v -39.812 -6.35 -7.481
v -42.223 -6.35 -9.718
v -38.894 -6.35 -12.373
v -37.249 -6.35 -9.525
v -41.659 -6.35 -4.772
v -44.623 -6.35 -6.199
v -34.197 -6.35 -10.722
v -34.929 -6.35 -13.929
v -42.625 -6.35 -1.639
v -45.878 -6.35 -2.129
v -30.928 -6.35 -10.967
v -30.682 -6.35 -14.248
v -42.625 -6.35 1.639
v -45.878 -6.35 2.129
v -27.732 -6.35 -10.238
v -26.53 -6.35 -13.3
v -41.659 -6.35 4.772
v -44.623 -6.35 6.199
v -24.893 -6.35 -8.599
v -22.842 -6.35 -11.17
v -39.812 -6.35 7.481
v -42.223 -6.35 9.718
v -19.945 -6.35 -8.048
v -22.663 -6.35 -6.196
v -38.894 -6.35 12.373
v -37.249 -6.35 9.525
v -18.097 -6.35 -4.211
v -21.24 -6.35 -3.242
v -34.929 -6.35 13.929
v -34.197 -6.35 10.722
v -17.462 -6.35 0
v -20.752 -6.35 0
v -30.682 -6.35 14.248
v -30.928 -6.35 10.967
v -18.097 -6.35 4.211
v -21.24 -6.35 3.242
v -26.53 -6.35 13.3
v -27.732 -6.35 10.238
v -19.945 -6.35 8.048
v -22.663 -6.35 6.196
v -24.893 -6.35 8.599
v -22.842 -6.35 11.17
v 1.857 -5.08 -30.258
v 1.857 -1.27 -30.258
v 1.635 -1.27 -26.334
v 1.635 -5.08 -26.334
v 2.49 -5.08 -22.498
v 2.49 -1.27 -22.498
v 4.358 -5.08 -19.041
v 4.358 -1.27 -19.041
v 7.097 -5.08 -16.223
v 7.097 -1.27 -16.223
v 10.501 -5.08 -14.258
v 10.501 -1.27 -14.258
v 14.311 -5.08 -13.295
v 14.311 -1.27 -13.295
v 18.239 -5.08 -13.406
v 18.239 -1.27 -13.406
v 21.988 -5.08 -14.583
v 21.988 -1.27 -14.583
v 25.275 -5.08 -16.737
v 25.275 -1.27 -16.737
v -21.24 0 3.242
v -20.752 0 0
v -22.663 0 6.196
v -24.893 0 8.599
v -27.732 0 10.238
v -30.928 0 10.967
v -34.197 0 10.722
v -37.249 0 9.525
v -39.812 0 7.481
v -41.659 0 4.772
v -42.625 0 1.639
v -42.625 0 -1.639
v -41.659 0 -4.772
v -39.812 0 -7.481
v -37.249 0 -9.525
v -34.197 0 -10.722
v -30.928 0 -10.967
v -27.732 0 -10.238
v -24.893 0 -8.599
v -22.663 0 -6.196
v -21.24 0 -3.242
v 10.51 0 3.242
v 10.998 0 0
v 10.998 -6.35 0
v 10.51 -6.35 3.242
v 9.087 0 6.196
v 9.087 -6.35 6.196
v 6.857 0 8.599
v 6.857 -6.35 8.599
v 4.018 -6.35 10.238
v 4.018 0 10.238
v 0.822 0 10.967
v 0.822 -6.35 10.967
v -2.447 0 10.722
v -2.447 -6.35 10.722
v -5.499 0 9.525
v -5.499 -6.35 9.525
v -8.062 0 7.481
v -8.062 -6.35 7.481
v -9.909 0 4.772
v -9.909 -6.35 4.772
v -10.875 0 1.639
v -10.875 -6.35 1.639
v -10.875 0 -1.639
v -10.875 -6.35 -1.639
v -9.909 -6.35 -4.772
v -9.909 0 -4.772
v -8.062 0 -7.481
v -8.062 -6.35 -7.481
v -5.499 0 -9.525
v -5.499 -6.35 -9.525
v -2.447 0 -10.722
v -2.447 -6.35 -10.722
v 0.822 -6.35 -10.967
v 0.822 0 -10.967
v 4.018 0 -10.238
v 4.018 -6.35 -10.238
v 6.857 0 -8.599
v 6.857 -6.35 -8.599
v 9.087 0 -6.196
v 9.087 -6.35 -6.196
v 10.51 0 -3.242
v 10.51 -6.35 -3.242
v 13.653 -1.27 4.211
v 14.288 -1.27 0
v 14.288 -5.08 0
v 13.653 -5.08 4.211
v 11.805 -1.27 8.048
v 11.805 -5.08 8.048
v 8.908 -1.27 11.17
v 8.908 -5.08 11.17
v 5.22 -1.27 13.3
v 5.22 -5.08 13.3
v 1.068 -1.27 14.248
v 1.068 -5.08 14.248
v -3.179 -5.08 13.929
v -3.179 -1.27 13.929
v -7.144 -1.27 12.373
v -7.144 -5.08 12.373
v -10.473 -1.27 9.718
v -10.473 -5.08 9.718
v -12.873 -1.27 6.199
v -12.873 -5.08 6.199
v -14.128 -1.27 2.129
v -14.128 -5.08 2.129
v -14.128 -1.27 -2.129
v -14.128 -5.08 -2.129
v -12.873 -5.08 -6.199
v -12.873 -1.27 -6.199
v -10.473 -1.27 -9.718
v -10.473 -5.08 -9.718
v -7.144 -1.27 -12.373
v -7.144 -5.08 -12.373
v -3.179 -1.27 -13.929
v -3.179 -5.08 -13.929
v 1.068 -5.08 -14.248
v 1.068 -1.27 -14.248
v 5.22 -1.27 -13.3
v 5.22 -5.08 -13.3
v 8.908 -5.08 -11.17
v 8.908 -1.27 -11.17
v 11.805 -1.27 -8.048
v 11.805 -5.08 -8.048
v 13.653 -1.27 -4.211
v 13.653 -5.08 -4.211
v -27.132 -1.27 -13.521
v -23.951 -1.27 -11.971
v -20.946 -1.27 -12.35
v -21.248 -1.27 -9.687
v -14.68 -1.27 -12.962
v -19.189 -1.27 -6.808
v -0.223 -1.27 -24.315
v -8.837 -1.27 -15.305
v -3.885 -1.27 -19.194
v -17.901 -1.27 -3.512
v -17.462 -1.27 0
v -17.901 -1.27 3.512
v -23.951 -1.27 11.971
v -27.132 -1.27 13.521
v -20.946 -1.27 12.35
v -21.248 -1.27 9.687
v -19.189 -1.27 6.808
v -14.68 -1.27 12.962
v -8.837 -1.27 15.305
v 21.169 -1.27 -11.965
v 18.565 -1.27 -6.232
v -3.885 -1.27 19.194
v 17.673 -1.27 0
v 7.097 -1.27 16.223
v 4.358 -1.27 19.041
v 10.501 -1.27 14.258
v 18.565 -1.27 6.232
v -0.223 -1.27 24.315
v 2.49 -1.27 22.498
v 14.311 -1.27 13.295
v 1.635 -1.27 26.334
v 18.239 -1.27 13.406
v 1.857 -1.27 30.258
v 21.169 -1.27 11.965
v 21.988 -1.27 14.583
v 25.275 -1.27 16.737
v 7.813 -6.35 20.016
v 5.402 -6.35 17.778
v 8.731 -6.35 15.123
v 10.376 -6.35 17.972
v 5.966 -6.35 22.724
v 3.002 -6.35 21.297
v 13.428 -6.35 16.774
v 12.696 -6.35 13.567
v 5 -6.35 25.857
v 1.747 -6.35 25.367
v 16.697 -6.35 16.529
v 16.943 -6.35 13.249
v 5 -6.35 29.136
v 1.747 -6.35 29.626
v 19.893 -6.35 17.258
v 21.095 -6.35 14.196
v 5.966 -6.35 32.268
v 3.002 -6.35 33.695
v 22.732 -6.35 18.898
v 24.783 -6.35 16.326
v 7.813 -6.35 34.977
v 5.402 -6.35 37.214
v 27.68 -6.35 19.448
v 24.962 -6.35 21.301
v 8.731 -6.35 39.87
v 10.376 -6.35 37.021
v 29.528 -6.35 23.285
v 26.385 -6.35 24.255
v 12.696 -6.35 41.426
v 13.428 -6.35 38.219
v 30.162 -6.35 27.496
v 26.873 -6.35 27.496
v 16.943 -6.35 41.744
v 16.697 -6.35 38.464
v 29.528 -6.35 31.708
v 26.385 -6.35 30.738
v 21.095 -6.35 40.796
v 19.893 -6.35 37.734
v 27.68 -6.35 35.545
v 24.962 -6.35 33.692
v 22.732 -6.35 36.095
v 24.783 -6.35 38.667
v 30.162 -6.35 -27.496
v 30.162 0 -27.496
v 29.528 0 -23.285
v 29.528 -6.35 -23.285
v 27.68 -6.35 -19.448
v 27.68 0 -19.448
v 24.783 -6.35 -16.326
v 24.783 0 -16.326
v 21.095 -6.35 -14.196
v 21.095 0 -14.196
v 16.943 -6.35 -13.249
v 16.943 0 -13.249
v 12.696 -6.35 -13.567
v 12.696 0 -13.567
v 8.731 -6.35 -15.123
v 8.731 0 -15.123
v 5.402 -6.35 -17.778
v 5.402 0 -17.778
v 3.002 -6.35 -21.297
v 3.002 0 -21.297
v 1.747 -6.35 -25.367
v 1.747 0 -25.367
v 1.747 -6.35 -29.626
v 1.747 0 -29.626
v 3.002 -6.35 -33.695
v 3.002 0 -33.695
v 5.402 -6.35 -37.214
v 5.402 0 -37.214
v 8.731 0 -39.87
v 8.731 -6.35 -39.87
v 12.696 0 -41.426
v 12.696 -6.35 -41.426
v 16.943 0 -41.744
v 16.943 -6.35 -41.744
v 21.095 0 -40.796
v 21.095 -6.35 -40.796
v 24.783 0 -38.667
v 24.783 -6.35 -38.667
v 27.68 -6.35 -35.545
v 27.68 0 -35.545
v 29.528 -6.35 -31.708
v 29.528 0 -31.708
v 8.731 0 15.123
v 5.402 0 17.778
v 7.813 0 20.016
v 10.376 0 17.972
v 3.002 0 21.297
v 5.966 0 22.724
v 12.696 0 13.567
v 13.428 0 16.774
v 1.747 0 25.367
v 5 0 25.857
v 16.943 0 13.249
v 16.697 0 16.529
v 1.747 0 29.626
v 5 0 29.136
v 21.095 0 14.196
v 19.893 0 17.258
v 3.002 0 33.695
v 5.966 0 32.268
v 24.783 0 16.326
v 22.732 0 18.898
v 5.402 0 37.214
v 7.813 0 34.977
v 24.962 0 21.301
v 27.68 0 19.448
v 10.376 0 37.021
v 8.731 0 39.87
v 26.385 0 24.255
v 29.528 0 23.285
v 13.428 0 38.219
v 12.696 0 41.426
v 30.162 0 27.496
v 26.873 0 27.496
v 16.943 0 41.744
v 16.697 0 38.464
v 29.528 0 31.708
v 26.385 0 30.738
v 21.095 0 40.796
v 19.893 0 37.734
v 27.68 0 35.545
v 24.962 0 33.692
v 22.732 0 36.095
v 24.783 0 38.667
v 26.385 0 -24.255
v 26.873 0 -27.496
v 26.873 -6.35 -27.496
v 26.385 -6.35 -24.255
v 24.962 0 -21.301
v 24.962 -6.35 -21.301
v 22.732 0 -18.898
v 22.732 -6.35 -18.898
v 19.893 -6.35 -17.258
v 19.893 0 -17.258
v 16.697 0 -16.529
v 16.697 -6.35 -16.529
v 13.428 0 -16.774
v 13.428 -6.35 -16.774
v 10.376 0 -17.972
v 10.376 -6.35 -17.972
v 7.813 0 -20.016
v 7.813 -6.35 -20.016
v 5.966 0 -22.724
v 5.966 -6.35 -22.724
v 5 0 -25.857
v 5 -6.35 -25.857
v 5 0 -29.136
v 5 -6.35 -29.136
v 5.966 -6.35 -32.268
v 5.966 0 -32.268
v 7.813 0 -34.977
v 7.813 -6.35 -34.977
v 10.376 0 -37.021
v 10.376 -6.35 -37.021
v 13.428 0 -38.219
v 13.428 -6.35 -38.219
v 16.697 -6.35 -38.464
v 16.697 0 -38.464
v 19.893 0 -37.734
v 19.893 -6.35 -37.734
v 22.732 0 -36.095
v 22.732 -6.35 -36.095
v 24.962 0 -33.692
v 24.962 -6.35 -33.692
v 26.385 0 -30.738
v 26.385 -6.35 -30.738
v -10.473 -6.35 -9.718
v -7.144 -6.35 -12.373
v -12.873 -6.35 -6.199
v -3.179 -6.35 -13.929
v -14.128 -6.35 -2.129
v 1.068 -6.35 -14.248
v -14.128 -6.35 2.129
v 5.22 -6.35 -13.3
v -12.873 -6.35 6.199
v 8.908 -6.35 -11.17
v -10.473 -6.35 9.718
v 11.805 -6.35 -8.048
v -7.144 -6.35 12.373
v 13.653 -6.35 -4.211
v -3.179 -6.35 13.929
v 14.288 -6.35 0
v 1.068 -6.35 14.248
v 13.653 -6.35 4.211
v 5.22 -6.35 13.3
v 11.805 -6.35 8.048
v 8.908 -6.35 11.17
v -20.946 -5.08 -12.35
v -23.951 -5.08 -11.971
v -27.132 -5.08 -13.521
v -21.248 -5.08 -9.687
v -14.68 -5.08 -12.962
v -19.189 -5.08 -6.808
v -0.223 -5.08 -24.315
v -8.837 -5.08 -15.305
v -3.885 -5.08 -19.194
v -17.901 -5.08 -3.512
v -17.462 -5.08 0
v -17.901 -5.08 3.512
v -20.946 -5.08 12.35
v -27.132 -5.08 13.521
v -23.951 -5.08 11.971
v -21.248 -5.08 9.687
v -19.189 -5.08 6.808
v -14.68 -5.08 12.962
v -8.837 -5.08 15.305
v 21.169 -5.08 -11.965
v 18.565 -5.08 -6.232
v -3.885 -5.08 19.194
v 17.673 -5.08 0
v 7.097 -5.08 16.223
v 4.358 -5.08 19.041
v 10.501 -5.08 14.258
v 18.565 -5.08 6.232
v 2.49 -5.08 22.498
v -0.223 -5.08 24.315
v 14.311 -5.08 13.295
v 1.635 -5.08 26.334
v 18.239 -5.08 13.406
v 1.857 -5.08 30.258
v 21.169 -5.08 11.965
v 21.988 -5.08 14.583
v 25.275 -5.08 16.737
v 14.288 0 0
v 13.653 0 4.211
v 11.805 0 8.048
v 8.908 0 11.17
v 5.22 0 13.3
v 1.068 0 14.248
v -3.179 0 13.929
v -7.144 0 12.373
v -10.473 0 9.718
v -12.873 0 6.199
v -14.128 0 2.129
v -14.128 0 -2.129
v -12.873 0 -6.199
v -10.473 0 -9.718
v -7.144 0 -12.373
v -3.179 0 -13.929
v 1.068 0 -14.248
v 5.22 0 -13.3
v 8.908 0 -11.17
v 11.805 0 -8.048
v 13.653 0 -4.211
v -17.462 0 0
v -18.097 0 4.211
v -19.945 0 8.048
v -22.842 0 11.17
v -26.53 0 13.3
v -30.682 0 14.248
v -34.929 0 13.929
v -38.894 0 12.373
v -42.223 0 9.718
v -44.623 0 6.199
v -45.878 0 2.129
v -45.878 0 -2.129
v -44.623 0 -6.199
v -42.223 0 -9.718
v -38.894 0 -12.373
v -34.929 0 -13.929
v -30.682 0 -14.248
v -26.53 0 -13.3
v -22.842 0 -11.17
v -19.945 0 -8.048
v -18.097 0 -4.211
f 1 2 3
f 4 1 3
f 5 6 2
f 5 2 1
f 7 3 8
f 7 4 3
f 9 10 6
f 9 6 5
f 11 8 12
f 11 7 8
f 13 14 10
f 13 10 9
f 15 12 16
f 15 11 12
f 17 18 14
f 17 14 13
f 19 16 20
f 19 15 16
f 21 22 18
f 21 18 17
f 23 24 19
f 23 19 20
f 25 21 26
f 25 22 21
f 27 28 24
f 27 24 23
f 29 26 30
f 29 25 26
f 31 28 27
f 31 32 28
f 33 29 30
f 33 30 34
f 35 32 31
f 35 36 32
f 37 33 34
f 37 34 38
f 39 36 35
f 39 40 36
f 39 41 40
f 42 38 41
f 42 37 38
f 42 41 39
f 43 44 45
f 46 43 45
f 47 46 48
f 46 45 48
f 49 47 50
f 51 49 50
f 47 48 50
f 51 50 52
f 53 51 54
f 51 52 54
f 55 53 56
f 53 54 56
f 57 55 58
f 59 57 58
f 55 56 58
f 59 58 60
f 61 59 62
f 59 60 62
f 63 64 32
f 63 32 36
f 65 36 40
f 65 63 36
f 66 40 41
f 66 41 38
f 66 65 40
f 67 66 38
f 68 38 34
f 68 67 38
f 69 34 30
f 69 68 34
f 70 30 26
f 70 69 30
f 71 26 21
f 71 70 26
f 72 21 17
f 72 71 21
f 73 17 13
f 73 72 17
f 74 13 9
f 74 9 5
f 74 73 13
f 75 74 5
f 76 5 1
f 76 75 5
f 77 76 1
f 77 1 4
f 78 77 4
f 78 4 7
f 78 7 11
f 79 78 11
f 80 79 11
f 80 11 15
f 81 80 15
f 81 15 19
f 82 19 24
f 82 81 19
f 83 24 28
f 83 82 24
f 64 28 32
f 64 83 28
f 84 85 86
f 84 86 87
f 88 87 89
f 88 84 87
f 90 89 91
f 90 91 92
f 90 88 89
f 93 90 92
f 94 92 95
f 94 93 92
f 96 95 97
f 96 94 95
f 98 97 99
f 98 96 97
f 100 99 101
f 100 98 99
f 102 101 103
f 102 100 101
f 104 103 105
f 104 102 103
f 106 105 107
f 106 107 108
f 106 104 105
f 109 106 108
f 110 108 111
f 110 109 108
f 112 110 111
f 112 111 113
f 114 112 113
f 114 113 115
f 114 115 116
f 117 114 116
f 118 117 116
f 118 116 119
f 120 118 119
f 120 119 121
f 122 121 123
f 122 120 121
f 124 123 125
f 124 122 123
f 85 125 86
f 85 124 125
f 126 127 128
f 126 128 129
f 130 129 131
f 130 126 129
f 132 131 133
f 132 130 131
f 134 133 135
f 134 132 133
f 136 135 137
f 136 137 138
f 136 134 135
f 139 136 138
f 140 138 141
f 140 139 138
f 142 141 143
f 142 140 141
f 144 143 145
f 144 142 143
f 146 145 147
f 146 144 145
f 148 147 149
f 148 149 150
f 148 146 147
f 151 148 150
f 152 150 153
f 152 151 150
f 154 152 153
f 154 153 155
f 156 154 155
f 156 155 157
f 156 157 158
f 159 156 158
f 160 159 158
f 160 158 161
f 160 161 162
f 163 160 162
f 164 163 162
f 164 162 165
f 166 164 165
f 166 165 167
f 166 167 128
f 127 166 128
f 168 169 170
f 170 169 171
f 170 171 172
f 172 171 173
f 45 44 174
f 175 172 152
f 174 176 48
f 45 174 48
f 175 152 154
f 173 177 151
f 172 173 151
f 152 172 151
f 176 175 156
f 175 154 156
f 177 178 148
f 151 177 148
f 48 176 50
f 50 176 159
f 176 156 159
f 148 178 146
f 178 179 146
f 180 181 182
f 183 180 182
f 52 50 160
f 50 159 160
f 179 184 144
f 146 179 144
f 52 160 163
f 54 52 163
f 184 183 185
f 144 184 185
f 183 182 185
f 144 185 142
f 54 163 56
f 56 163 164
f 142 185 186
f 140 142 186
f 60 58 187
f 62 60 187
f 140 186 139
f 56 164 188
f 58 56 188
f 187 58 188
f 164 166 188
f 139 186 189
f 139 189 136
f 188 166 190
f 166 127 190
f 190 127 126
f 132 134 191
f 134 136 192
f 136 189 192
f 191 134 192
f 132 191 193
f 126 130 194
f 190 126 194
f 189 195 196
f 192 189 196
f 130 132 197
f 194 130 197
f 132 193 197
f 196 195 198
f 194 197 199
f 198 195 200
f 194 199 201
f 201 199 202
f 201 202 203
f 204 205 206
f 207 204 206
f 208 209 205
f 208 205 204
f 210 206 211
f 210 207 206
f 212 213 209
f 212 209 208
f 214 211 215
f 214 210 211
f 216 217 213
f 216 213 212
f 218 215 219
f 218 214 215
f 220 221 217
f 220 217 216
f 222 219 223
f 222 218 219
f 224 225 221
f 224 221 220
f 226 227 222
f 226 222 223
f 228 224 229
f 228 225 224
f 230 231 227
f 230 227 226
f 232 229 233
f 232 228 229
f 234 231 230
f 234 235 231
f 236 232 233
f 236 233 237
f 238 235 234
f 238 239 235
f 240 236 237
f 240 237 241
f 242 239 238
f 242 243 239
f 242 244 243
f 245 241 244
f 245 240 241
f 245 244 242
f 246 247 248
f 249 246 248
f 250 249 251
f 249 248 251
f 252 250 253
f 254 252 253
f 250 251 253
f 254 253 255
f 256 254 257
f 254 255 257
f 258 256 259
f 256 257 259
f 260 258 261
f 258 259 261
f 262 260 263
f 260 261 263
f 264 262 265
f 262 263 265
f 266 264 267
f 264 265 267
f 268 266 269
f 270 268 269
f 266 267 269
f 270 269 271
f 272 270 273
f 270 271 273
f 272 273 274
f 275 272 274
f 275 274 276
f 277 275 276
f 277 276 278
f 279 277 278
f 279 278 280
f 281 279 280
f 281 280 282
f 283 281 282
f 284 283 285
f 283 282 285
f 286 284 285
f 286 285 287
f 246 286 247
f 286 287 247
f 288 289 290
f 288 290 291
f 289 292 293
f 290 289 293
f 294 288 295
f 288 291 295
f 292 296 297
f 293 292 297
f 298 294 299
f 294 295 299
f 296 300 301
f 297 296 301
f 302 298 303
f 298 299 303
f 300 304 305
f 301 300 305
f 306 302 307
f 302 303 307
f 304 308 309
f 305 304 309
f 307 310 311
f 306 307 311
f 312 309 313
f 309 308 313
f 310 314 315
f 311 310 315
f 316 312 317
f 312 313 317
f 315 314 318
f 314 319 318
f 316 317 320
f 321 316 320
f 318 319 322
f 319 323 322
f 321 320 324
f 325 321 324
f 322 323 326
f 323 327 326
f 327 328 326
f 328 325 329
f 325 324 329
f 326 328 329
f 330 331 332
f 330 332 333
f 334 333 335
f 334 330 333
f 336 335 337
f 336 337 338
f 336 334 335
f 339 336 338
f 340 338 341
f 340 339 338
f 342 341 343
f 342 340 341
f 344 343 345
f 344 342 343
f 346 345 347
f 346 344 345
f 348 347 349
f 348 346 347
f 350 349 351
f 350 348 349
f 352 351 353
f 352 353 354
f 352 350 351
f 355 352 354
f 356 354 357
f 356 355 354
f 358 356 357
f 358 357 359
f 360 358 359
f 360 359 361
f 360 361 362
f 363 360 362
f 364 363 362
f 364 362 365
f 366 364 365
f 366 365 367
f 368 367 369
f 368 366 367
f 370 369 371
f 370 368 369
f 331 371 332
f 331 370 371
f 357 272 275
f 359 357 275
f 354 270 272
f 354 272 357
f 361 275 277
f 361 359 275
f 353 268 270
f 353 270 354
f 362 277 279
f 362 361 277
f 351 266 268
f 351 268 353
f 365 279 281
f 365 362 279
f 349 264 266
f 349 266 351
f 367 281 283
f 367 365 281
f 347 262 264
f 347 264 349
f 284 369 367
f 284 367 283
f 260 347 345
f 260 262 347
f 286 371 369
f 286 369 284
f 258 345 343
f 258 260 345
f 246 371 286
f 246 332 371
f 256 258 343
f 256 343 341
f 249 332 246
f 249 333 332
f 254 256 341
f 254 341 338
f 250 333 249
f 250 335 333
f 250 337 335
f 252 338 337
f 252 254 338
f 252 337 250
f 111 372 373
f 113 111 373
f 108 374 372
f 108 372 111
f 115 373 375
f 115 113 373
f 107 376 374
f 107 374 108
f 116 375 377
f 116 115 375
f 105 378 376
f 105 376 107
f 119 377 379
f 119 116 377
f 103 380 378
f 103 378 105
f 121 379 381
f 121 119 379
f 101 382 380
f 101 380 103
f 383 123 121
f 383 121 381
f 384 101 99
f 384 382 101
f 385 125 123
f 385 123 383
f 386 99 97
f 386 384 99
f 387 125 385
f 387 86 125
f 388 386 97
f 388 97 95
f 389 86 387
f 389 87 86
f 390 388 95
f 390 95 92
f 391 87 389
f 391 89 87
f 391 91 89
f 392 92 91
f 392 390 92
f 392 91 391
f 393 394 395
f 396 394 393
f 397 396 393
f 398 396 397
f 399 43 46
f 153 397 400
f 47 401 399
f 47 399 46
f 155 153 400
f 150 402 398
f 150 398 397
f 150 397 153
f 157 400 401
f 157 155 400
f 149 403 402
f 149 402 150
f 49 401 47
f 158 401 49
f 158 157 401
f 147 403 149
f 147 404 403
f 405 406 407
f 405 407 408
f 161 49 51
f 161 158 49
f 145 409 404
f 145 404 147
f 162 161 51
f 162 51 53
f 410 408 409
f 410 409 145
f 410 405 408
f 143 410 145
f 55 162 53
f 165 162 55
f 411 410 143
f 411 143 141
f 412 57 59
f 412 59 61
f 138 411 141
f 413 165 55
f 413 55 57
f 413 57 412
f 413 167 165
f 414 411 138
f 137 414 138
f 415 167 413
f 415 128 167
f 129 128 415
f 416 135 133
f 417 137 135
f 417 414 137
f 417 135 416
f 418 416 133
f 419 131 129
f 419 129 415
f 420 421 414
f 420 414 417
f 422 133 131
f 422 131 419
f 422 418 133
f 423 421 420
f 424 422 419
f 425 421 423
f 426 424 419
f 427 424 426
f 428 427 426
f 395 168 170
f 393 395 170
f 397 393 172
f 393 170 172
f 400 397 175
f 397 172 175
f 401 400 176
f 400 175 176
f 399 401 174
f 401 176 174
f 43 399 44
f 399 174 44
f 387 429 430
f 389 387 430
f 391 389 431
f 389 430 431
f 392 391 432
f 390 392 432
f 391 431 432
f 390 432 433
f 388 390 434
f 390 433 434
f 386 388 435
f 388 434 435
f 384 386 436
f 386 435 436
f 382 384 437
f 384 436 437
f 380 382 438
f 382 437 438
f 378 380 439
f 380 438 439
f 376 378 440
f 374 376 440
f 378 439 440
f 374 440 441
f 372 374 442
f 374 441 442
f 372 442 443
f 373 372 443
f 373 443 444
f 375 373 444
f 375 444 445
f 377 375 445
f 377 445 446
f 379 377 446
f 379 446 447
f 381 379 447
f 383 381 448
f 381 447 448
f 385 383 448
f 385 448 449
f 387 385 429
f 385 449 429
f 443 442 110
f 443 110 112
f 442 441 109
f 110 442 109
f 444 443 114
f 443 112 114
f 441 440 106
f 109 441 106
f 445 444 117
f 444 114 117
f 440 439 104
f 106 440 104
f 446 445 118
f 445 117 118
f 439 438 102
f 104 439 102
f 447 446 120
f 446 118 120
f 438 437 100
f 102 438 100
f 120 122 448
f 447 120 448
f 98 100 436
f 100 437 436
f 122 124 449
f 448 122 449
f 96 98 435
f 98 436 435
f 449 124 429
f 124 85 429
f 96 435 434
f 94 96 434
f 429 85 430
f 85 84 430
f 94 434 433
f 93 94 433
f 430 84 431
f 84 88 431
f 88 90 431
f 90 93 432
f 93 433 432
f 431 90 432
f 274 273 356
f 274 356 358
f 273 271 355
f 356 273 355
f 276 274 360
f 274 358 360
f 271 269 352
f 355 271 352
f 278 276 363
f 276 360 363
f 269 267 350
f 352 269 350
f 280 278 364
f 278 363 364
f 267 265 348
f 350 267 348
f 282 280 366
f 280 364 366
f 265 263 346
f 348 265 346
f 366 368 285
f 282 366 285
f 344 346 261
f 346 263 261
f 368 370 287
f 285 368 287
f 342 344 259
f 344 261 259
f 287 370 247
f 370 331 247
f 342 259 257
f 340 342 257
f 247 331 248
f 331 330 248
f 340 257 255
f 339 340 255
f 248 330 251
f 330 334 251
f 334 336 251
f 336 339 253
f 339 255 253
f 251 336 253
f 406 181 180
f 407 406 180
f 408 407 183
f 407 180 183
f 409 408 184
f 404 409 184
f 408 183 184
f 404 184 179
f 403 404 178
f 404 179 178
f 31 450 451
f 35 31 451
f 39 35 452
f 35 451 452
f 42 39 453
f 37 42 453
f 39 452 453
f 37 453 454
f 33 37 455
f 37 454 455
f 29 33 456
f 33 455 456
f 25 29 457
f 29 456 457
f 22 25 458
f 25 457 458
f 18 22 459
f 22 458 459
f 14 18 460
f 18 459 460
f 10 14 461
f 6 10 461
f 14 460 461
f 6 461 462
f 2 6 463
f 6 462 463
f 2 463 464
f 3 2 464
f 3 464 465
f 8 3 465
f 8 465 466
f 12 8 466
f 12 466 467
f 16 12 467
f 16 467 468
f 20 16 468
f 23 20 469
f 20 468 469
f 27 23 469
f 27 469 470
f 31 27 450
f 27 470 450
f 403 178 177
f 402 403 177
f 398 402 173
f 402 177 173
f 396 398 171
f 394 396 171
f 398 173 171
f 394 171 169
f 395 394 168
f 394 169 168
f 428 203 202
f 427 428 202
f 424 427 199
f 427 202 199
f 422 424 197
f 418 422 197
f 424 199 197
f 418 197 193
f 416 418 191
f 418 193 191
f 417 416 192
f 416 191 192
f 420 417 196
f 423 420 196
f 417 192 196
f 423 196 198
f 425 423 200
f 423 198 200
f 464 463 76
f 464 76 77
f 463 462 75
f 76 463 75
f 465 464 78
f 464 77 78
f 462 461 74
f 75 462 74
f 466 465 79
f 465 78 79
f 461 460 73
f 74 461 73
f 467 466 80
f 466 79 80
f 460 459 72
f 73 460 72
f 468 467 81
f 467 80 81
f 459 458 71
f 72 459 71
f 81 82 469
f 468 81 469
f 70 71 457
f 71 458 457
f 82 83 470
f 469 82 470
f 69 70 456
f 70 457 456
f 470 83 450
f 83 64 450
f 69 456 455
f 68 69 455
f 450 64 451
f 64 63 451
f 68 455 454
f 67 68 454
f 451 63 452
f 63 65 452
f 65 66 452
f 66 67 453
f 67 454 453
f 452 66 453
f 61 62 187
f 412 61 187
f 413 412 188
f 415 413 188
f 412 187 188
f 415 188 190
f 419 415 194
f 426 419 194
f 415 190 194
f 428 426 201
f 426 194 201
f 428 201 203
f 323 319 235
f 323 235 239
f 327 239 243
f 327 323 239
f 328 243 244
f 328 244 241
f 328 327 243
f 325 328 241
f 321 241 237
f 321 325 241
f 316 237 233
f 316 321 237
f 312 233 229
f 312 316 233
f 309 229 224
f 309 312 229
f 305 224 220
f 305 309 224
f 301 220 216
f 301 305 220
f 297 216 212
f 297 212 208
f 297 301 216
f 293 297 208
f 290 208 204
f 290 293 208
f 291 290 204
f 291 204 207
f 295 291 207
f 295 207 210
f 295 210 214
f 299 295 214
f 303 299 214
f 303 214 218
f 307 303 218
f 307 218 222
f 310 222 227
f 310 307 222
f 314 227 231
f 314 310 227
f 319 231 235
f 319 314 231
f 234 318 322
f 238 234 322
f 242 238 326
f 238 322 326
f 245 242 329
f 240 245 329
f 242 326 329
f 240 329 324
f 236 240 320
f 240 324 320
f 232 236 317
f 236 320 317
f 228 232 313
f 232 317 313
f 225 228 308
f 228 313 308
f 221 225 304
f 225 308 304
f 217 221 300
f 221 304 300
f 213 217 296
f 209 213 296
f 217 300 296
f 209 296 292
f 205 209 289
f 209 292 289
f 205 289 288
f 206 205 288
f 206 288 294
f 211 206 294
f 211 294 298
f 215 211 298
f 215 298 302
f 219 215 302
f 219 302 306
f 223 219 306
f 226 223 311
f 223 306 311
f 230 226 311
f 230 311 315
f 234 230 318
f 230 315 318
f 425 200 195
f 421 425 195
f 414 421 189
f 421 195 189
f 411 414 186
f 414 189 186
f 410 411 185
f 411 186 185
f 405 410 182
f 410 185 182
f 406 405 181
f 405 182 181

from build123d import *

# Parameters (mm, degrees)
F0_R     = 14.2875
F0_R_2   = 10.9982
F2_DEPTH = 6.35
F1_R     = 14.2875
F3_DEPTH = 1.27
F4_DEPTH = 1.27


with BuildPart() as f2:
    # F0 (on Front) → F2 (new body)
    with BuildSketch(Plane.XZ):
        with Locations((-31.75, 0)):
            Circle(F0_R)
        with Locations((-31.75, 0)):
            Circle(F0_R_2, mode=Mode.SUBTRACT)
    extrude(amount=F2_DEPTH)


with BuildPart() as f2b:
    # F0 (on Front) → F2, piece 2 (new body)
    with BuildSketch(Plane.XZ):
        with Locations((15.875, 27.4963065702)):
            Circle(F0_R)
        with Locations((15.875, 27.4963065702)):
            Circle(F0_R_2, mode=Mode.SUBTRACT)
    extrude(amount=F2_DEPTH)


with BuildPart() as f2c:
    # F0 (on Front) → F2, piece 3 (new body)
    with BuildSketch(Plane.XZ):
        with Locations((15.875, -27.4963065702)):
            Circle(F0_R)
        with Locations((15.875, -27.4963065702)):
            Circle(F0_R_2, mode=Mode.SUBTRACT)
    extrude(amount=F2_DEPTH)


with BuildPart() as f2d:
    # F0 (on Front) → F2, piece 4 (new body)
    with BuildSketch(Plane.XZ):
        Circle(F0_R)
        Circle(F0_R_2, mode=Mode.SUBTRACT)
    extrude(amount=F2_DEPTH)


with BuildPart() as f2e:
    # F1 (on Front) → F2, piece 5 (new body)
    with BuildSketch(Plane.XZ):
        with BuildLine():
            ThreePointArc((1.8568672225, 30.257576148), (-8.8366170981, 15.305469781), (-27.1322632123, 13.5206938879))
            ThreePointArc((-27.1322632123, 13.5206938879), (-20.1287141287, 8.3113399009), (-17.4625, 0))
            ThreePointArc((-17.4625, 0), (-20.1287141287, -8.3113399009), (-27.1322632123, -13.5206938879))
            ThreePointArc((-27.1322632123, -13.5206938879), (-8.8366170981, -15.305469781), (1.8568672225, -30.257576148))
            ThreePointArc((1.8568672225, -30.257576148), (8.73125, -15.1229686136), (25.2753959899, -16.7368822601))
            ThreePointArc((25.2753959899, -16.7368822601), (17.6732341963, 0), (25.2753959899, 16.7368822601))
            ThreePointArc((25.2753959899, 16.7368822601), (8.73125, 15.1229686136), (1.8568672225, 30.257576148))
        make_face()
        Circle(F1_R, mode=Mode.SUBTRACT)
    extrude(amount=F2_DEPTH)

    # F3 (cut): a face of the model
    f3_faces = [f2e.faces().sort_by_distance(p)[0] for p in [
        (16.8726939787, 0, 0),
    ]]
    extrude(f3_faces, amount=-F3_DEPTH, mode=Mode.SUBTRACT)

    # F4 (cut): a face of the model
    f4_faces = [f2e.faces().sort_by_distance(p)[0] for p in [
        (16.8726939787, -6.35, 0),
    ]]
    extrude(f4_faces, amount=-F4_DEPTH, mode=Mode.SUBTRACT)


solid = Compound([f2.part, f2b.part, f2c.part, f2d.part, f2e.part])
